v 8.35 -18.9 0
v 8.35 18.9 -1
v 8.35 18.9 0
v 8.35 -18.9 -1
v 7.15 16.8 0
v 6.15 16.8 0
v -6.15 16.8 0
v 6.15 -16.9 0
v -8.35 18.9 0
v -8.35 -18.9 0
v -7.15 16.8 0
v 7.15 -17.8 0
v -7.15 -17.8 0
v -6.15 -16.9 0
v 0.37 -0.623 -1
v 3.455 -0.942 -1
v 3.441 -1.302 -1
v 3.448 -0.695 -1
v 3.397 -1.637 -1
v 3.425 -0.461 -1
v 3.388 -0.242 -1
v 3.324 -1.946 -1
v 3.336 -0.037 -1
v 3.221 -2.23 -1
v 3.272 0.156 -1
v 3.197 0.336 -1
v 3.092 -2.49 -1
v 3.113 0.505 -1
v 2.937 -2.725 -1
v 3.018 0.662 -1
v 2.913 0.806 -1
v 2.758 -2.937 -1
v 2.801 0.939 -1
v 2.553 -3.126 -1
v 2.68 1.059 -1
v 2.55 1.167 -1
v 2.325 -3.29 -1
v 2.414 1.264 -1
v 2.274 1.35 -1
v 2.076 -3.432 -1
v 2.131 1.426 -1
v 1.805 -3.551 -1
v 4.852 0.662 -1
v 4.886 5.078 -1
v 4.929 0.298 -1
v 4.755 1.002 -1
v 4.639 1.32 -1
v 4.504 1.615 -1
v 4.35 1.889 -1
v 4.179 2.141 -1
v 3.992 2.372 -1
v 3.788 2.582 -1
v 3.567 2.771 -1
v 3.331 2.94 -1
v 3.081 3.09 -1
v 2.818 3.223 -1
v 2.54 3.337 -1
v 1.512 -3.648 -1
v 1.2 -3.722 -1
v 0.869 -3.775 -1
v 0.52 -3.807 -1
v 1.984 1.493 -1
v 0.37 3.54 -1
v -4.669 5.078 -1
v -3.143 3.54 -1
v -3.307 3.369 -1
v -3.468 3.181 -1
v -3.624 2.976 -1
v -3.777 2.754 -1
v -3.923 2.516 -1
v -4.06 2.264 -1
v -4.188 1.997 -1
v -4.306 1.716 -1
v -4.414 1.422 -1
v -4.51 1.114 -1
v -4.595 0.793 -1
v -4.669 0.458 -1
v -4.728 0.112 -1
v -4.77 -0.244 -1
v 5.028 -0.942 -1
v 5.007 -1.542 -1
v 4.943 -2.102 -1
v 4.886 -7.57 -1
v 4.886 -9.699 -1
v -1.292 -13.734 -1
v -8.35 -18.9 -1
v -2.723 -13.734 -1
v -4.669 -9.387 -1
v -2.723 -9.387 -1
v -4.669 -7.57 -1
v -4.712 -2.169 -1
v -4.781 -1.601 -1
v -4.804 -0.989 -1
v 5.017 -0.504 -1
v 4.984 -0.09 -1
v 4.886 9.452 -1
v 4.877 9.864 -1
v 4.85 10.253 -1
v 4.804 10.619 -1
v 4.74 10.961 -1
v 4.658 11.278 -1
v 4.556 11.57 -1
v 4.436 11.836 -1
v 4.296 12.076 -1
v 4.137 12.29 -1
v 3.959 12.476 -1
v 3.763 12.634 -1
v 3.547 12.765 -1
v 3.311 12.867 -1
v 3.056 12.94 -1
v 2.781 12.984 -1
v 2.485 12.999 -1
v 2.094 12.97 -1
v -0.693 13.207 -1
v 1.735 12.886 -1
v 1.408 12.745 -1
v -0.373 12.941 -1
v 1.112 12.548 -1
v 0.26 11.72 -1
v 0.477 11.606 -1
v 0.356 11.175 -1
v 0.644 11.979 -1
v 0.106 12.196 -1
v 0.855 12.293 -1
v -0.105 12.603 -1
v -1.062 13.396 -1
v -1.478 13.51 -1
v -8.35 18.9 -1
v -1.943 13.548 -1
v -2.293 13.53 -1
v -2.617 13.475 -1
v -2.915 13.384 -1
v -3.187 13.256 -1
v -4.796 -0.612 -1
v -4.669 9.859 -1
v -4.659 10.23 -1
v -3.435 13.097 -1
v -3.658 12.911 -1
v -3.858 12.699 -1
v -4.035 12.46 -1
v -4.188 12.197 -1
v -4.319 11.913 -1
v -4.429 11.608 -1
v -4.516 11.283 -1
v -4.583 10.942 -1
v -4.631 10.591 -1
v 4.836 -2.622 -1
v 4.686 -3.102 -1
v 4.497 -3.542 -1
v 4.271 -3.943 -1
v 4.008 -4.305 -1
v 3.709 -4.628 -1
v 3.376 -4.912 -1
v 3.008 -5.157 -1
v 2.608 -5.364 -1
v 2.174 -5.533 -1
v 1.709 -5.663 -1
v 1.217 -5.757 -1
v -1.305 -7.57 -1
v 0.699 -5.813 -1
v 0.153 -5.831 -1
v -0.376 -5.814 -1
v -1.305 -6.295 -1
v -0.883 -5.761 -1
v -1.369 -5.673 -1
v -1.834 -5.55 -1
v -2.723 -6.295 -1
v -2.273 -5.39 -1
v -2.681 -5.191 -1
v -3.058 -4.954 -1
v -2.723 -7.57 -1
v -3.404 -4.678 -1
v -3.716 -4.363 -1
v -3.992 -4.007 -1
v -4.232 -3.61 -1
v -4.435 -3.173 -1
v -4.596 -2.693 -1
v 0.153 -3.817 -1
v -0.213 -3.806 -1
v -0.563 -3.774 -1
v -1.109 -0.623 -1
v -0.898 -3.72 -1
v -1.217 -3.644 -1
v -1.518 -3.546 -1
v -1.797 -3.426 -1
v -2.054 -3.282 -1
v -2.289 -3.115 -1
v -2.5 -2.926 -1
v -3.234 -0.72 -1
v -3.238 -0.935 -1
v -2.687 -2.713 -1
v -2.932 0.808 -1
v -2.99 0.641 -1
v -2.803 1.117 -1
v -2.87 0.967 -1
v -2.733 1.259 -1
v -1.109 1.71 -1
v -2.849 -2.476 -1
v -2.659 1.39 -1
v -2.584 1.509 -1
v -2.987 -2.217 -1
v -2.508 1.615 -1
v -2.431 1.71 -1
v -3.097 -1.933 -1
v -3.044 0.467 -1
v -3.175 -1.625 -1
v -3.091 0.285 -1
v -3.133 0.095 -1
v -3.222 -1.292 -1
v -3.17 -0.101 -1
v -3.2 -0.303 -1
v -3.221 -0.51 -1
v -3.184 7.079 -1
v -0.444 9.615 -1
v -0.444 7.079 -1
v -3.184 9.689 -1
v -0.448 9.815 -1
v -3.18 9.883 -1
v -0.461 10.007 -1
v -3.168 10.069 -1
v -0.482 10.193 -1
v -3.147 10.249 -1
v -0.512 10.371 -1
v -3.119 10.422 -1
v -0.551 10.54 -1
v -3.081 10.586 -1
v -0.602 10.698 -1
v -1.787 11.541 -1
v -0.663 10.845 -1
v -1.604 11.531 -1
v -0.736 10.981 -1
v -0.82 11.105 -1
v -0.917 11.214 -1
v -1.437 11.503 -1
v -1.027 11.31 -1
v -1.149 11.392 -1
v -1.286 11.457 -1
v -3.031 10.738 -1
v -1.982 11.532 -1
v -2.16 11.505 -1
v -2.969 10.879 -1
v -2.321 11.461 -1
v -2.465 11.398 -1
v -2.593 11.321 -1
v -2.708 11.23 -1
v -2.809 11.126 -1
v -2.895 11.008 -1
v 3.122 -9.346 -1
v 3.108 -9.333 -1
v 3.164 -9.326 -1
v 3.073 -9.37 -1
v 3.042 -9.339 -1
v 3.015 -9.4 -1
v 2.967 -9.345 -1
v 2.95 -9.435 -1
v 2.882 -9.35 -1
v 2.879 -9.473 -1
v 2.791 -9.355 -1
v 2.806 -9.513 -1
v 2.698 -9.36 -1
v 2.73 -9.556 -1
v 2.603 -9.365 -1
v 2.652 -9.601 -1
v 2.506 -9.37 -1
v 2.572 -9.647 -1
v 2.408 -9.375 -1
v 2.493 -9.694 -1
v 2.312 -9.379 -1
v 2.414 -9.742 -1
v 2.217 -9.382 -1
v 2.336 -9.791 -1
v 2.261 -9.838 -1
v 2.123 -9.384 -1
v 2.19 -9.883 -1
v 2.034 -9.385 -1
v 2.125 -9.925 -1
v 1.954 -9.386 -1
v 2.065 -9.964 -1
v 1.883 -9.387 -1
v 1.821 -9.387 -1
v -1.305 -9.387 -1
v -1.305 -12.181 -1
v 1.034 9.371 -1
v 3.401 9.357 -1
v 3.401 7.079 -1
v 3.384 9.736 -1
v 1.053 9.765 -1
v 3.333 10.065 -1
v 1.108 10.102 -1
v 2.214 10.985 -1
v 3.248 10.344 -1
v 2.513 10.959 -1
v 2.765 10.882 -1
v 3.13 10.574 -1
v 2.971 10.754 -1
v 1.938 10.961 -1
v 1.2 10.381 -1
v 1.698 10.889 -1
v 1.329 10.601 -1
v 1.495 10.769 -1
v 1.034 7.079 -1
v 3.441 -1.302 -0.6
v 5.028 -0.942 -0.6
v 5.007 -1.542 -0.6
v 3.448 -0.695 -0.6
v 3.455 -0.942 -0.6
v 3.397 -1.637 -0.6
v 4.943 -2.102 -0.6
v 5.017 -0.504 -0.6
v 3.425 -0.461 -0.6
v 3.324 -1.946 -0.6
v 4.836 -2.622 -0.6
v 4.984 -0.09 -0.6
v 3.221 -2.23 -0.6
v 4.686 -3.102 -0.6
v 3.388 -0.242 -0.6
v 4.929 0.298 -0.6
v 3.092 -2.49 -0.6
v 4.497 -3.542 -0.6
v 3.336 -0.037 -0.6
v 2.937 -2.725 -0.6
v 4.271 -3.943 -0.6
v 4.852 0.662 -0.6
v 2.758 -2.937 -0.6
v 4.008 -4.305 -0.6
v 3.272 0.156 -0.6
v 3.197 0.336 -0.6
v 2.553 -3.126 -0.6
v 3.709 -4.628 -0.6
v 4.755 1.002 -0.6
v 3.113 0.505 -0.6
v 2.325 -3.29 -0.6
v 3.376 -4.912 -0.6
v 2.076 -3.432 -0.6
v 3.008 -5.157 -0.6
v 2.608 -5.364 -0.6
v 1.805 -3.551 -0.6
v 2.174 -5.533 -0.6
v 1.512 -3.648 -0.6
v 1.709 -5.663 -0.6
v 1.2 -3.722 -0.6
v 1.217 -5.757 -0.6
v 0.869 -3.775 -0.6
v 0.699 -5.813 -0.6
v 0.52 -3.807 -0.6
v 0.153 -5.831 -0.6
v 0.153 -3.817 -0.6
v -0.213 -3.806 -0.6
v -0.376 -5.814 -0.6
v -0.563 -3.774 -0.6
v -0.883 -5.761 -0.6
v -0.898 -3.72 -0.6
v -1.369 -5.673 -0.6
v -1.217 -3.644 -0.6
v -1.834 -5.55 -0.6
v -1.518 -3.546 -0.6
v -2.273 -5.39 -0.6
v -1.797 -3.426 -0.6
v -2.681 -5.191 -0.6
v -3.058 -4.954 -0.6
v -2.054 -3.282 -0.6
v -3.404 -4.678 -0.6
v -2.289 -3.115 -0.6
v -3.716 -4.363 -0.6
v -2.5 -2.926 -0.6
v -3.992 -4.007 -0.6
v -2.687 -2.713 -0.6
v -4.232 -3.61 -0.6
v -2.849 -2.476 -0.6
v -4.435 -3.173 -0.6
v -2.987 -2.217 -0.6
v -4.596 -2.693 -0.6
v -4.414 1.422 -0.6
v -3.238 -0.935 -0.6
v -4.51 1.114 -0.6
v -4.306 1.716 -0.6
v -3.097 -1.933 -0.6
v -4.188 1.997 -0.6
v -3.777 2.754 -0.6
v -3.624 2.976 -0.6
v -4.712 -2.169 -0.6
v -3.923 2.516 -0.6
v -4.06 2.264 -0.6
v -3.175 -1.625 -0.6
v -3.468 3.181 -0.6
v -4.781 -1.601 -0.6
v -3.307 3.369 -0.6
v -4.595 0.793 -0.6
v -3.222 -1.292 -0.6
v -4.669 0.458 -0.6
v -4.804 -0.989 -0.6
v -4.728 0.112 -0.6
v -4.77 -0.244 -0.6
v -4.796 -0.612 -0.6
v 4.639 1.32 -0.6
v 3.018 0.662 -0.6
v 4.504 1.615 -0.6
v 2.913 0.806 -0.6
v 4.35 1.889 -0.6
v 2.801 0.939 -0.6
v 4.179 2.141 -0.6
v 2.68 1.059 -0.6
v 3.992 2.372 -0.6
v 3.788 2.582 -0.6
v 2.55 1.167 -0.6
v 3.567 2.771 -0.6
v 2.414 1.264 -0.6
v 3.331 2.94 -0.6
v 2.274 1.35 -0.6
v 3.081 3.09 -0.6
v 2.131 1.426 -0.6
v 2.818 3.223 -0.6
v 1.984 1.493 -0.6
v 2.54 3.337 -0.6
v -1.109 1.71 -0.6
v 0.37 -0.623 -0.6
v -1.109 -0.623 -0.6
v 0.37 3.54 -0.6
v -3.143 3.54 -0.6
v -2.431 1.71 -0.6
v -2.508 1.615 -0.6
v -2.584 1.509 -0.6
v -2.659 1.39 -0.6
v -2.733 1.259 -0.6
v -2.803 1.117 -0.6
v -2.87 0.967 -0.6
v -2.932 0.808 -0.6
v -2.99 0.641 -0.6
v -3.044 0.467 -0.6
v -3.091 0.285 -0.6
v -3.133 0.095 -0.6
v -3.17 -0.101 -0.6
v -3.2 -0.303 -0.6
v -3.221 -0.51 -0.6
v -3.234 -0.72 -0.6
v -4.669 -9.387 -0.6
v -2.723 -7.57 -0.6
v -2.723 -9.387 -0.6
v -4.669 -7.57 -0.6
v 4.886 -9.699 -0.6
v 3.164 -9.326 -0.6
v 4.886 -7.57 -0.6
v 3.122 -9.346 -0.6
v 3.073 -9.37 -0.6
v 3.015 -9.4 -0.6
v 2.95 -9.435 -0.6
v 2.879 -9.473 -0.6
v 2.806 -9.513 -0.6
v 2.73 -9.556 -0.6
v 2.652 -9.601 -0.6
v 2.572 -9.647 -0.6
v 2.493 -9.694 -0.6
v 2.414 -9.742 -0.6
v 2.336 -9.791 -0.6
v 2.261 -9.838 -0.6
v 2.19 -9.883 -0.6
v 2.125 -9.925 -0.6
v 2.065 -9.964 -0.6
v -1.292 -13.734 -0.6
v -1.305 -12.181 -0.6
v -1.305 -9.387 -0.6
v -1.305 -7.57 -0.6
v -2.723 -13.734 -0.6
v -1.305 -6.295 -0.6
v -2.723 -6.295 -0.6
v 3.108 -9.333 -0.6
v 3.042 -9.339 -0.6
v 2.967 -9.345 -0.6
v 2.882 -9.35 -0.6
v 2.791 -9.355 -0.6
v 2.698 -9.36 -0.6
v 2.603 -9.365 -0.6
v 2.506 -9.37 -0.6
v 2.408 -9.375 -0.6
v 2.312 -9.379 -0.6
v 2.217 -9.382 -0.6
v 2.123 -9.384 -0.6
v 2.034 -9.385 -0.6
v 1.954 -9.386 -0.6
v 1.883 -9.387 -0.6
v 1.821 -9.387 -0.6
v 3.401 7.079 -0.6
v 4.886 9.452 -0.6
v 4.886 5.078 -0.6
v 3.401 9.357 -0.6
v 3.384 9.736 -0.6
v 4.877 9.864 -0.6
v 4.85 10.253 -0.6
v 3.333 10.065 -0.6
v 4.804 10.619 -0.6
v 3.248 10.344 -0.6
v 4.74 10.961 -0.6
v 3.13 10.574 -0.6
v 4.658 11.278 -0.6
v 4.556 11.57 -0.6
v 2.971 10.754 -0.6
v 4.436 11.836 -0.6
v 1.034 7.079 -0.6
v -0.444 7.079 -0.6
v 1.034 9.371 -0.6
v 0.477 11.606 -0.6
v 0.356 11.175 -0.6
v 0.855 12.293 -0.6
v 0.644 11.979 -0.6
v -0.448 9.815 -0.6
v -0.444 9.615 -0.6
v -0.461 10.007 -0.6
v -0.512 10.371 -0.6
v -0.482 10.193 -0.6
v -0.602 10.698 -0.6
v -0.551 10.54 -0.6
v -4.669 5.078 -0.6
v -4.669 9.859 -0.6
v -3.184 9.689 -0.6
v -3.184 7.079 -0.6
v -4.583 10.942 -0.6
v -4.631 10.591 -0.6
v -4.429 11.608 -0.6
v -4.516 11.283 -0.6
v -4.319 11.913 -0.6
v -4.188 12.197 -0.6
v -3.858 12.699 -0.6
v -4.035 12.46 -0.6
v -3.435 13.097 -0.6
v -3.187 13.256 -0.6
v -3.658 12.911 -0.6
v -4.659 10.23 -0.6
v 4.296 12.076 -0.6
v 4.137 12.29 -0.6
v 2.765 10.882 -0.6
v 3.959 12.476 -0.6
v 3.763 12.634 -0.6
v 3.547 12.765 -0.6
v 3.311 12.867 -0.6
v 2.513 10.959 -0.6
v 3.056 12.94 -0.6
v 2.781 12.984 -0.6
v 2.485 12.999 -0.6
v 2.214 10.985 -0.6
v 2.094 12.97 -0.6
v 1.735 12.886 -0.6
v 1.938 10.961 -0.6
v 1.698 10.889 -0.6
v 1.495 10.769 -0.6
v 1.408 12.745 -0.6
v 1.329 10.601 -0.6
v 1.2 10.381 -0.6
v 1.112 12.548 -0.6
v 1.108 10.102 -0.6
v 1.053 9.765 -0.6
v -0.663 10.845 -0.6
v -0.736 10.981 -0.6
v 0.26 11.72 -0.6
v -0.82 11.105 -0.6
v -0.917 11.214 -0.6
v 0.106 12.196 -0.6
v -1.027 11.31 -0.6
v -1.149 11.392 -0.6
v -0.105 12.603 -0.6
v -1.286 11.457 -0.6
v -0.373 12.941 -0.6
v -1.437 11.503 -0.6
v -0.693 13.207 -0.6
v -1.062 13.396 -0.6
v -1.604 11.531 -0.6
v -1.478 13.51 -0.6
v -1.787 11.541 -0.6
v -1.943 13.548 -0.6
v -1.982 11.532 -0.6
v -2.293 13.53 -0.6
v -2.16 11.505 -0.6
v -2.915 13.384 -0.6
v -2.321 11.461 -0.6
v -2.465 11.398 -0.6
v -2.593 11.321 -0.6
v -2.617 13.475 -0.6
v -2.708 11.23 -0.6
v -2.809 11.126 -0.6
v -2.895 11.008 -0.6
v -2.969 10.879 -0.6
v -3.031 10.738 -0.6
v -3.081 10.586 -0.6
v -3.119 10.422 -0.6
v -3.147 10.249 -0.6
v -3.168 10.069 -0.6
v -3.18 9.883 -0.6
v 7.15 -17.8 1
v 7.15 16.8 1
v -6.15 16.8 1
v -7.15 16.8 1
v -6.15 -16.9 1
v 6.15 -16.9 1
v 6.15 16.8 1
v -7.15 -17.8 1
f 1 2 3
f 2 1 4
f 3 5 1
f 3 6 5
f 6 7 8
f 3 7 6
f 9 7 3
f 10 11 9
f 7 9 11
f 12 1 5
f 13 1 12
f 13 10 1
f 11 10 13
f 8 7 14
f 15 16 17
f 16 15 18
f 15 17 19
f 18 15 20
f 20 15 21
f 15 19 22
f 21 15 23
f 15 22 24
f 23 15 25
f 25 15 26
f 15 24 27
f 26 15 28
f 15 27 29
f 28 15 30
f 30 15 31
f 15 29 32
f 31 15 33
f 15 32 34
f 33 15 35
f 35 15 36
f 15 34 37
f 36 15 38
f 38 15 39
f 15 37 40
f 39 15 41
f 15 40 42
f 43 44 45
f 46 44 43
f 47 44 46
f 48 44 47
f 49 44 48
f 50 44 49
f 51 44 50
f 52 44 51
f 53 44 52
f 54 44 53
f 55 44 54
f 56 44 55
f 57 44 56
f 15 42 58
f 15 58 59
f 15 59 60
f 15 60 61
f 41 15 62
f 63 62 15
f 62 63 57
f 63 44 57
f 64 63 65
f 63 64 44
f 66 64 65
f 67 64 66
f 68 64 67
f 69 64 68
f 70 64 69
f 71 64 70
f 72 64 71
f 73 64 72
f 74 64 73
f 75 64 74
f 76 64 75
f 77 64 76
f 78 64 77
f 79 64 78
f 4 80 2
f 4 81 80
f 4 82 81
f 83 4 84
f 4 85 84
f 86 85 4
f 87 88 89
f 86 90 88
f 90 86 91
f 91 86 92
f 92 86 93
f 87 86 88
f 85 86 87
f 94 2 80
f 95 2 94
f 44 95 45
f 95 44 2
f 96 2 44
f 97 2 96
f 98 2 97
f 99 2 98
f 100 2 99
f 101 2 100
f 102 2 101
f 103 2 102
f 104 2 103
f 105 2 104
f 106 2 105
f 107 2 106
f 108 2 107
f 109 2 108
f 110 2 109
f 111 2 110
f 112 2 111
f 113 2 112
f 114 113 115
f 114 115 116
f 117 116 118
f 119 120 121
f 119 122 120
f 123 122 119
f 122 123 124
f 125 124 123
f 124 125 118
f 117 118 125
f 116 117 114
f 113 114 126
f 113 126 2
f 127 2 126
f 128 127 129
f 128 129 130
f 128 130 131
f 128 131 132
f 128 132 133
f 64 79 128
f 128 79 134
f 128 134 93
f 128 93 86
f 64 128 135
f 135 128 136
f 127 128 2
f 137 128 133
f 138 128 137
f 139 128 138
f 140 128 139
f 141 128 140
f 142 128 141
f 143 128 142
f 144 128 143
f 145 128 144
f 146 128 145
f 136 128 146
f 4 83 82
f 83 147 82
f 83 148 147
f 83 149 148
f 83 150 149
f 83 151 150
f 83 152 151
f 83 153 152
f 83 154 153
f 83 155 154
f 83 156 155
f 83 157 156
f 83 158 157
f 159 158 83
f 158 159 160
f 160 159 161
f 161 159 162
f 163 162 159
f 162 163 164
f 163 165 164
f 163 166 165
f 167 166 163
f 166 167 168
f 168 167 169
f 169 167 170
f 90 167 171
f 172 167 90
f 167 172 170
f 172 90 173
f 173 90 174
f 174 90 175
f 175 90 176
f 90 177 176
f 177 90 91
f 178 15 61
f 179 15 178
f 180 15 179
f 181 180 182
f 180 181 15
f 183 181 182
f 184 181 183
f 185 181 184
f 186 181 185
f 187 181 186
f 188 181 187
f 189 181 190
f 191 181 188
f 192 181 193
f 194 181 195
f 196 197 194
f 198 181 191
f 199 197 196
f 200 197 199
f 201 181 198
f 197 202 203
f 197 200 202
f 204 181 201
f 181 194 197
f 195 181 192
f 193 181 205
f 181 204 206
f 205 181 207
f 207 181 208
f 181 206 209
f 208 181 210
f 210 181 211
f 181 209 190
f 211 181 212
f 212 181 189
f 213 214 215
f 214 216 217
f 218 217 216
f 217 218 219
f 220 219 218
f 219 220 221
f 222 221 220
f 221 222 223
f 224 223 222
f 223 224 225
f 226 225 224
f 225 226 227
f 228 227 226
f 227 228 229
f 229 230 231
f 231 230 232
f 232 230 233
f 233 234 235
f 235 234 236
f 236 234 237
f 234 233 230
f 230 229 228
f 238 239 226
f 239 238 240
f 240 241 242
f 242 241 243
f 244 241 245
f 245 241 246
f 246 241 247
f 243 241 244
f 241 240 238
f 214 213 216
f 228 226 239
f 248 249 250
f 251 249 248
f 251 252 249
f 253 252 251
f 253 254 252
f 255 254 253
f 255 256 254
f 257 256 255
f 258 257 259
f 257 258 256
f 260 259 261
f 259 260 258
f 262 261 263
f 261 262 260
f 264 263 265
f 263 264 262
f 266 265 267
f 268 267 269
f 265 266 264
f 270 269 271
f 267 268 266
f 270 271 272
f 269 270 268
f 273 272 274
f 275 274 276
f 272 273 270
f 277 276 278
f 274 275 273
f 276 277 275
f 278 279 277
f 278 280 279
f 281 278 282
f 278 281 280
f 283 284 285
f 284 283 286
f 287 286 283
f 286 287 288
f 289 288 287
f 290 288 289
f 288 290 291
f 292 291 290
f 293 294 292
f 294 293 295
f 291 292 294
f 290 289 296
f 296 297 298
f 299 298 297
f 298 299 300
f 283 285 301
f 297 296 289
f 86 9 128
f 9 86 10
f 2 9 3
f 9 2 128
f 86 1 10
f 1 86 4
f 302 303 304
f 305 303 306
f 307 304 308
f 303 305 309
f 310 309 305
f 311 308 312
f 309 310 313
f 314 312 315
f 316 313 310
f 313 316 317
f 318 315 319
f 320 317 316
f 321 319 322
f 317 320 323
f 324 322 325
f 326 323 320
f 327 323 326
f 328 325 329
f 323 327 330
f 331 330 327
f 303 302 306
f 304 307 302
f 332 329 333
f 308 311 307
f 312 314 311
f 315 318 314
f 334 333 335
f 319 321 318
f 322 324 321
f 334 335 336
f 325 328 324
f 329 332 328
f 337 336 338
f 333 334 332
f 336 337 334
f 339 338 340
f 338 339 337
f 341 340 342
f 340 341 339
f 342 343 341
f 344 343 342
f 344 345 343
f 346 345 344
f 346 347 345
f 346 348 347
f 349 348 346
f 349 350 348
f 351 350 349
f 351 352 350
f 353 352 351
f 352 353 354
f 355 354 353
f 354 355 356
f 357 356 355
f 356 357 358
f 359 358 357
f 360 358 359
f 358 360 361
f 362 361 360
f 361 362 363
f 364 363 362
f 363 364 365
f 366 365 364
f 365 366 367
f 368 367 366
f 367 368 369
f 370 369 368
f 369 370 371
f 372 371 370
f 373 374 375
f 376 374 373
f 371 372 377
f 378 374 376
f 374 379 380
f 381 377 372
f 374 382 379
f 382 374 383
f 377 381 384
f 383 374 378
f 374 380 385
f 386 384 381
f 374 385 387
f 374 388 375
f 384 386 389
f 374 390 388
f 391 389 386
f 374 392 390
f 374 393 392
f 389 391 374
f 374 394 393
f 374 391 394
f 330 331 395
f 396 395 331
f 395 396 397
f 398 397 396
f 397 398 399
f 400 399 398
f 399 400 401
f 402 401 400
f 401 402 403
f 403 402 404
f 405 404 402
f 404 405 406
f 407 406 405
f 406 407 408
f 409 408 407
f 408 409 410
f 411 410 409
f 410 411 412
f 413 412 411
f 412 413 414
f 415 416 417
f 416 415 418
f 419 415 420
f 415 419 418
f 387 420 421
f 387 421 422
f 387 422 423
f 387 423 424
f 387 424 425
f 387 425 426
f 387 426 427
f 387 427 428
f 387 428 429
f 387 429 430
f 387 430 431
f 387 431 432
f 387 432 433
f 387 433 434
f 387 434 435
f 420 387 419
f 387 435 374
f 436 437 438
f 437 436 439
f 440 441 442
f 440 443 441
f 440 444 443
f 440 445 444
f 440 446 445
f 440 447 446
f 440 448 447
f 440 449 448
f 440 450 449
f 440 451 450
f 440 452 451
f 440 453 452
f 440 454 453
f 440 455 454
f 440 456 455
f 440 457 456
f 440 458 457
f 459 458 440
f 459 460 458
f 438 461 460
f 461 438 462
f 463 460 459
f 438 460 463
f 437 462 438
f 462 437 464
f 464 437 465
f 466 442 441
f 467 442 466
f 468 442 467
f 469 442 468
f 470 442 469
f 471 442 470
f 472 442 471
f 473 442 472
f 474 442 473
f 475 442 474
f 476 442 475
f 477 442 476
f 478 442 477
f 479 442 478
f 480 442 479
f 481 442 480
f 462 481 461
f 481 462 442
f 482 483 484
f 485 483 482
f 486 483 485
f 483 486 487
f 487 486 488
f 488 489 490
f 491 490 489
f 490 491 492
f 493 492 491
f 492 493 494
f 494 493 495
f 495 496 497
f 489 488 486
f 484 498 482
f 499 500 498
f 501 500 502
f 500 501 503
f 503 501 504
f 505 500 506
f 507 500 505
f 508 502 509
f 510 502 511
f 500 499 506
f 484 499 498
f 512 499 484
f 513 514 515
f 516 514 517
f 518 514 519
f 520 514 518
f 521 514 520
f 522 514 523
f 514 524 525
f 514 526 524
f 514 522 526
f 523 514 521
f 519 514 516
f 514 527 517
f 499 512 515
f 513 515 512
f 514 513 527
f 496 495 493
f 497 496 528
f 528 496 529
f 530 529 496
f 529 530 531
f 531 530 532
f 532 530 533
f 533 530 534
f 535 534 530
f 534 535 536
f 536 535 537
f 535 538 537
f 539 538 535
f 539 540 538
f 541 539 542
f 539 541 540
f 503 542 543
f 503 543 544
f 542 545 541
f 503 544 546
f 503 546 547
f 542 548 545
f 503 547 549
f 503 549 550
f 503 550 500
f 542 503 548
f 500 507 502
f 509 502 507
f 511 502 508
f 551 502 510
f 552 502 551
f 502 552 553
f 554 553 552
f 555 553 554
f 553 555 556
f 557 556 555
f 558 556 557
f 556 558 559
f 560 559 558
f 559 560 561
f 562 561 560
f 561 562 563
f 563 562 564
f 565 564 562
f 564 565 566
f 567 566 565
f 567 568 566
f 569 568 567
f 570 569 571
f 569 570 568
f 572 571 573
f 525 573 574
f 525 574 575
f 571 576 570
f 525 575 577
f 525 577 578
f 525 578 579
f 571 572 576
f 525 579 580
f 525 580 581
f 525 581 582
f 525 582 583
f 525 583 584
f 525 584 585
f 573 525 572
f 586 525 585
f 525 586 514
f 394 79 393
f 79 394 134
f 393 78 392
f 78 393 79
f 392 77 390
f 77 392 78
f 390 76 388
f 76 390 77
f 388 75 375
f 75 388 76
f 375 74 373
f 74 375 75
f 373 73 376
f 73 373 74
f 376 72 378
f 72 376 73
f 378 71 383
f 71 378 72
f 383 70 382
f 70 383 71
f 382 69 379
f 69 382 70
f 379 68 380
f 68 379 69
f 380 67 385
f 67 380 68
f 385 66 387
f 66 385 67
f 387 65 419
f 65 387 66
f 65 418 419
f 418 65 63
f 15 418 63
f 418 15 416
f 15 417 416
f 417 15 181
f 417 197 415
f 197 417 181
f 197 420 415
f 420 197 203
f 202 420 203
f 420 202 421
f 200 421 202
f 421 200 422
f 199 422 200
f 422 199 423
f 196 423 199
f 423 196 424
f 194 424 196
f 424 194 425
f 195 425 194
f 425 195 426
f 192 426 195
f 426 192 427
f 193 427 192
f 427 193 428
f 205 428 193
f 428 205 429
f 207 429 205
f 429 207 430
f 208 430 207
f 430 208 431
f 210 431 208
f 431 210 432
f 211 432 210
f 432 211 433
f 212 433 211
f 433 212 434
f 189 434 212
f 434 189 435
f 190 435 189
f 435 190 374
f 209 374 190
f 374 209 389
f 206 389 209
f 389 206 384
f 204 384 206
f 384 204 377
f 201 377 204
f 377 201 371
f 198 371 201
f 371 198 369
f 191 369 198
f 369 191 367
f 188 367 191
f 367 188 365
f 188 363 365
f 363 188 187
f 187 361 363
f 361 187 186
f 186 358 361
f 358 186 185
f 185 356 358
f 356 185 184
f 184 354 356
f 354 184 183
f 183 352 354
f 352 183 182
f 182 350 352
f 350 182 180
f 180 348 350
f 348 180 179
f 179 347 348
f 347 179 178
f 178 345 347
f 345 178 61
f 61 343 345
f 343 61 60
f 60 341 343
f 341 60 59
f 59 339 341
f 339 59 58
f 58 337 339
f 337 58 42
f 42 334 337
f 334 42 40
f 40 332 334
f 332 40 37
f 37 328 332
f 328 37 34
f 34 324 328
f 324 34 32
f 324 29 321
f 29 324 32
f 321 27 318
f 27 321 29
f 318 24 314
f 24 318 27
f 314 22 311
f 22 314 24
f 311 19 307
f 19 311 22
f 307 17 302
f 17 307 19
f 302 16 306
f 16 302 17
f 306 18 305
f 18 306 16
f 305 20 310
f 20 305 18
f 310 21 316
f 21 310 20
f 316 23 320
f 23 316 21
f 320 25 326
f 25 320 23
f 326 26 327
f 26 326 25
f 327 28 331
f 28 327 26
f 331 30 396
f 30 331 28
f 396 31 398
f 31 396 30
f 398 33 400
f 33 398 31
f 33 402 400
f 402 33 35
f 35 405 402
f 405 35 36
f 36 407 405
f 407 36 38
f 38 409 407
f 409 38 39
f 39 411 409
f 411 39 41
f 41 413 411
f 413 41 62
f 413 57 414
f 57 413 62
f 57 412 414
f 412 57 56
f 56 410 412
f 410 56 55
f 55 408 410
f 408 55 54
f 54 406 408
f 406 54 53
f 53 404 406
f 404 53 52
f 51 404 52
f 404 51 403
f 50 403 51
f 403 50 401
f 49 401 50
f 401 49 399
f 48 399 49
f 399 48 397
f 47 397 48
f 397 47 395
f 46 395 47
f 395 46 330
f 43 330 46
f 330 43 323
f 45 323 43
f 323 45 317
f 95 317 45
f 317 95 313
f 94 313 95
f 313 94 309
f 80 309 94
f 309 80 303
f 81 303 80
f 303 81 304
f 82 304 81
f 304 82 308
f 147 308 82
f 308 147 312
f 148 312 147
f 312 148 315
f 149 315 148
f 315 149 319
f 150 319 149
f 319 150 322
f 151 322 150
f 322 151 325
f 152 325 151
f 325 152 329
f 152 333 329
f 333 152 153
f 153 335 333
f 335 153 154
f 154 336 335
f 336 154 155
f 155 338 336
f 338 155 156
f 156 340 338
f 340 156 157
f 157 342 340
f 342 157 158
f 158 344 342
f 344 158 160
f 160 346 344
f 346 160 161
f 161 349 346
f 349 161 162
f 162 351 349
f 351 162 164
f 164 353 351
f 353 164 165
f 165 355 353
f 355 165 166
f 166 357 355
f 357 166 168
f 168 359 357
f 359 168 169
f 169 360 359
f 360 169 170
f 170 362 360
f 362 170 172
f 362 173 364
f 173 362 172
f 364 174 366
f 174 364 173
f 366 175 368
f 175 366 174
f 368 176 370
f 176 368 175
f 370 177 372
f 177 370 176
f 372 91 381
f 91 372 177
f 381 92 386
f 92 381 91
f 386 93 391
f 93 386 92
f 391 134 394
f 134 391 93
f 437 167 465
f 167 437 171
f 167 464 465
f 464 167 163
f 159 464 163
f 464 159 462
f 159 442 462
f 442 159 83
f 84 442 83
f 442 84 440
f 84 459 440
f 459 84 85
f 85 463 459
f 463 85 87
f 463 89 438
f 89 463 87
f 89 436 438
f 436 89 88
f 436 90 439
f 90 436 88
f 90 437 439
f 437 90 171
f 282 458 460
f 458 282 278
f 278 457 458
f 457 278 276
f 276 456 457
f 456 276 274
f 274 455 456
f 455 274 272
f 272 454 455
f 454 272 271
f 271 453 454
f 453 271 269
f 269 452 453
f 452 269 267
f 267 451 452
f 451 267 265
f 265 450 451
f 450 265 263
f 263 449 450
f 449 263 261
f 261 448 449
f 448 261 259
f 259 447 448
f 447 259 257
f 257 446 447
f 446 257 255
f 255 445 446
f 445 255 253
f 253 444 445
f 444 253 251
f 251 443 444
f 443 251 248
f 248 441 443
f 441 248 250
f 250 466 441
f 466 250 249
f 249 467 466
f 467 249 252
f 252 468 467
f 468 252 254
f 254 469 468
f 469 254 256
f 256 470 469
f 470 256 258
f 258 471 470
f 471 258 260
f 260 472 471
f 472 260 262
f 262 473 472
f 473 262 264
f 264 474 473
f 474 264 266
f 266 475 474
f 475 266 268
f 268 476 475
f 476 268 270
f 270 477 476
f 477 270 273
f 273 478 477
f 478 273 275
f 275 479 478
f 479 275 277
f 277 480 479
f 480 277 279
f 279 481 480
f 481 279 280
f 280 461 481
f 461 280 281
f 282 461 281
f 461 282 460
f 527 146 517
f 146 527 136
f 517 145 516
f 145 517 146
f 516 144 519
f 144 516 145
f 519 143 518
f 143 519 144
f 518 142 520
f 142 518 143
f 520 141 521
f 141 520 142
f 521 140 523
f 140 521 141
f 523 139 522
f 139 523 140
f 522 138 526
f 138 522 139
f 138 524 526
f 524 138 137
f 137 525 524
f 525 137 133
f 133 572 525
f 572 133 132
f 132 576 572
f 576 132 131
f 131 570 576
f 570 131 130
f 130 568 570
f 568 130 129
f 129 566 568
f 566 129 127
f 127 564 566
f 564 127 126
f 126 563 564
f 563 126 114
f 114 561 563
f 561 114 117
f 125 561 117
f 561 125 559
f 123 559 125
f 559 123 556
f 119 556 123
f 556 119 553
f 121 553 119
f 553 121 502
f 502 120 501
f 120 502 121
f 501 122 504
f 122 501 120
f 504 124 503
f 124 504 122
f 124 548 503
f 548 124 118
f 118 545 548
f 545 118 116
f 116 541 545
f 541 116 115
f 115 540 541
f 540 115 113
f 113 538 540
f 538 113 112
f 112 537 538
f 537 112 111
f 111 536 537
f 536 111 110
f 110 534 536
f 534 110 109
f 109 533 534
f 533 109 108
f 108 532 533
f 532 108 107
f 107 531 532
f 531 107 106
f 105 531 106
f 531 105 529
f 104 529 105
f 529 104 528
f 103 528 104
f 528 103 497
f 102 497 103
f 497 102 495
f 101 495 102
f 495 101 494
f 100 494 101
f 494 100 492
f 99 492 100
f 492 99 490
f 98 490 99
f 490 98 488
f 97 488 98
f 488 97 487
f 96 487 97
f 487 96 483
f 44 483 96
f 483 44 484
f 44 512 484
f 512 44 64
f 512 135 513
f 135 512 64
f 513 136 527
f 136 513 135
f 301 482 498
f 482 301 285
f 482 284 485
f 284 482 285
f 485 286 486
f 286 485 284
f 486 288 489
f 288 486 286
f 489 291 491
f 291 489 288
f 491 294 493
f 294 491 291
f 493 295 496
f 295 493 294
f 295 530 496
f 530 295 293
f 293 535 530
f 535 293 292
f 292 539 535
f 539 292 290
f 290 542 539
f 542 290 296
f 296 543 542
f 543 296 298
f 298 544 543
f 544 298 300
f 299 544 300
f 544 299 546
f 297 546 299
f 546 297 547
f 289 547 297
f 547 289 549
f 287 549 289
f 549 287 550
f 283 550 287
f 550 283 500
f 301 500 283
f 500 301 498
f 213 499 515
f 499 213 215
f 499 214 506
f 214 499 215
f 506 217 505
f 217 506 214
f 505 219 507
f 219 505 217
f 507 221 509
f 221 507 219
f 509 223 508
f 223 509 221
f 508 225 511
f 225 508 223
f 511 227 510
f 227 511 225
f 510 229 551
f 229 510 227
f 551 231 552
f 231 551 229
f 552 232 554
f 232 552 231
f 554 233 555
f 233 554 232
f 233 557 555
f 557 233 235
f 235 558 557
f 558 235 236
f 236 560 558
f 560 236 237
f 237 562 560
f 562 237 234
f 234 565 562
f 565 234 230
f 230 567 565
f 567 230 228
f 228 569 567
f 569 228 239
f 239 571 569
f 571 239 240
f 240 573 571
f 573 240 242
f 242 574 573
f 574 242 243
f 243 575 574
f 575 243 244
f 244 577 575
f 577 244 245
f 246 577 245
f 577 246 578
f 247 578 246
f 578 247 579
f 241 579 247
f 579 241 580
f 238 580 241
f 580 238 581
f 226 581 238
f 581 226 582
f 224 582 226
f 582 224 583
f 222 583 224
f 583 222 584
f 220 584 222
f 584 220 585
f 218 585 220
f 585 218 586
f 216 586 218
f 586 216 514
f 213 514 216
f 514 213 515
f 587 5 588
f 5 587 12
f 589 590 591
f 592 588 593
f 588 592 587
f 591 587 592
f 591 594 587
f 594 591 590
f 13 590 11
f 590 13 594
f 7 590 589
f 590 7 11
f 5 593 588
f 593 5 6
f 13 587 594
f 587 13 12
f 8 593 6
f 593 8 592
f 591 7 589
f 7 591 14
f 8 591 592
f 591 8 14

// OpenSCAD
notchWidth = 1.2; //Width of slots on the side of the PCB
portLength = 23.4; //Distance between the front of the slot to the end of the USB port
boardLength = 23.4; //Dsitance from the rear of the slot to the back of the board
boardWidth = 14.7; // Width from one side of the board to the other
capacity = "4GB"; //The capacity of the drive to be written on the bottom
textSize = 10; // If you have a very large or small drive you can change the text size (default = 6)

USBLength = 12.2; // The required length of protruding port (should remain constant)
USBWidth = 12.7; // The width of a USB port (should remain constant)

unitLength = boardLength+notchWidth+(portLength-USBLength)+2;
difference(){
    translate([0, 0, -0.5])
        cube([boardWidth+2, unitLength,1], center=true);
    translate([0,0,-0.6])
        rotate([180,0,90])
            linear_extrude(height = 0.5)
                text(text = capacity, font = "Liberation Sans:style=Bold", size = textSize, valign = "center", halign = "center");
}
difference(){
    translate([0, -0.5, 0.5])
        cube([boardWidth-0.4, unitLength-3.2,1], center = true);
    translate([0, 1, 0.5])
        cube([boardWidth-2.4, unitLength-2,1.1], center = true);
}
